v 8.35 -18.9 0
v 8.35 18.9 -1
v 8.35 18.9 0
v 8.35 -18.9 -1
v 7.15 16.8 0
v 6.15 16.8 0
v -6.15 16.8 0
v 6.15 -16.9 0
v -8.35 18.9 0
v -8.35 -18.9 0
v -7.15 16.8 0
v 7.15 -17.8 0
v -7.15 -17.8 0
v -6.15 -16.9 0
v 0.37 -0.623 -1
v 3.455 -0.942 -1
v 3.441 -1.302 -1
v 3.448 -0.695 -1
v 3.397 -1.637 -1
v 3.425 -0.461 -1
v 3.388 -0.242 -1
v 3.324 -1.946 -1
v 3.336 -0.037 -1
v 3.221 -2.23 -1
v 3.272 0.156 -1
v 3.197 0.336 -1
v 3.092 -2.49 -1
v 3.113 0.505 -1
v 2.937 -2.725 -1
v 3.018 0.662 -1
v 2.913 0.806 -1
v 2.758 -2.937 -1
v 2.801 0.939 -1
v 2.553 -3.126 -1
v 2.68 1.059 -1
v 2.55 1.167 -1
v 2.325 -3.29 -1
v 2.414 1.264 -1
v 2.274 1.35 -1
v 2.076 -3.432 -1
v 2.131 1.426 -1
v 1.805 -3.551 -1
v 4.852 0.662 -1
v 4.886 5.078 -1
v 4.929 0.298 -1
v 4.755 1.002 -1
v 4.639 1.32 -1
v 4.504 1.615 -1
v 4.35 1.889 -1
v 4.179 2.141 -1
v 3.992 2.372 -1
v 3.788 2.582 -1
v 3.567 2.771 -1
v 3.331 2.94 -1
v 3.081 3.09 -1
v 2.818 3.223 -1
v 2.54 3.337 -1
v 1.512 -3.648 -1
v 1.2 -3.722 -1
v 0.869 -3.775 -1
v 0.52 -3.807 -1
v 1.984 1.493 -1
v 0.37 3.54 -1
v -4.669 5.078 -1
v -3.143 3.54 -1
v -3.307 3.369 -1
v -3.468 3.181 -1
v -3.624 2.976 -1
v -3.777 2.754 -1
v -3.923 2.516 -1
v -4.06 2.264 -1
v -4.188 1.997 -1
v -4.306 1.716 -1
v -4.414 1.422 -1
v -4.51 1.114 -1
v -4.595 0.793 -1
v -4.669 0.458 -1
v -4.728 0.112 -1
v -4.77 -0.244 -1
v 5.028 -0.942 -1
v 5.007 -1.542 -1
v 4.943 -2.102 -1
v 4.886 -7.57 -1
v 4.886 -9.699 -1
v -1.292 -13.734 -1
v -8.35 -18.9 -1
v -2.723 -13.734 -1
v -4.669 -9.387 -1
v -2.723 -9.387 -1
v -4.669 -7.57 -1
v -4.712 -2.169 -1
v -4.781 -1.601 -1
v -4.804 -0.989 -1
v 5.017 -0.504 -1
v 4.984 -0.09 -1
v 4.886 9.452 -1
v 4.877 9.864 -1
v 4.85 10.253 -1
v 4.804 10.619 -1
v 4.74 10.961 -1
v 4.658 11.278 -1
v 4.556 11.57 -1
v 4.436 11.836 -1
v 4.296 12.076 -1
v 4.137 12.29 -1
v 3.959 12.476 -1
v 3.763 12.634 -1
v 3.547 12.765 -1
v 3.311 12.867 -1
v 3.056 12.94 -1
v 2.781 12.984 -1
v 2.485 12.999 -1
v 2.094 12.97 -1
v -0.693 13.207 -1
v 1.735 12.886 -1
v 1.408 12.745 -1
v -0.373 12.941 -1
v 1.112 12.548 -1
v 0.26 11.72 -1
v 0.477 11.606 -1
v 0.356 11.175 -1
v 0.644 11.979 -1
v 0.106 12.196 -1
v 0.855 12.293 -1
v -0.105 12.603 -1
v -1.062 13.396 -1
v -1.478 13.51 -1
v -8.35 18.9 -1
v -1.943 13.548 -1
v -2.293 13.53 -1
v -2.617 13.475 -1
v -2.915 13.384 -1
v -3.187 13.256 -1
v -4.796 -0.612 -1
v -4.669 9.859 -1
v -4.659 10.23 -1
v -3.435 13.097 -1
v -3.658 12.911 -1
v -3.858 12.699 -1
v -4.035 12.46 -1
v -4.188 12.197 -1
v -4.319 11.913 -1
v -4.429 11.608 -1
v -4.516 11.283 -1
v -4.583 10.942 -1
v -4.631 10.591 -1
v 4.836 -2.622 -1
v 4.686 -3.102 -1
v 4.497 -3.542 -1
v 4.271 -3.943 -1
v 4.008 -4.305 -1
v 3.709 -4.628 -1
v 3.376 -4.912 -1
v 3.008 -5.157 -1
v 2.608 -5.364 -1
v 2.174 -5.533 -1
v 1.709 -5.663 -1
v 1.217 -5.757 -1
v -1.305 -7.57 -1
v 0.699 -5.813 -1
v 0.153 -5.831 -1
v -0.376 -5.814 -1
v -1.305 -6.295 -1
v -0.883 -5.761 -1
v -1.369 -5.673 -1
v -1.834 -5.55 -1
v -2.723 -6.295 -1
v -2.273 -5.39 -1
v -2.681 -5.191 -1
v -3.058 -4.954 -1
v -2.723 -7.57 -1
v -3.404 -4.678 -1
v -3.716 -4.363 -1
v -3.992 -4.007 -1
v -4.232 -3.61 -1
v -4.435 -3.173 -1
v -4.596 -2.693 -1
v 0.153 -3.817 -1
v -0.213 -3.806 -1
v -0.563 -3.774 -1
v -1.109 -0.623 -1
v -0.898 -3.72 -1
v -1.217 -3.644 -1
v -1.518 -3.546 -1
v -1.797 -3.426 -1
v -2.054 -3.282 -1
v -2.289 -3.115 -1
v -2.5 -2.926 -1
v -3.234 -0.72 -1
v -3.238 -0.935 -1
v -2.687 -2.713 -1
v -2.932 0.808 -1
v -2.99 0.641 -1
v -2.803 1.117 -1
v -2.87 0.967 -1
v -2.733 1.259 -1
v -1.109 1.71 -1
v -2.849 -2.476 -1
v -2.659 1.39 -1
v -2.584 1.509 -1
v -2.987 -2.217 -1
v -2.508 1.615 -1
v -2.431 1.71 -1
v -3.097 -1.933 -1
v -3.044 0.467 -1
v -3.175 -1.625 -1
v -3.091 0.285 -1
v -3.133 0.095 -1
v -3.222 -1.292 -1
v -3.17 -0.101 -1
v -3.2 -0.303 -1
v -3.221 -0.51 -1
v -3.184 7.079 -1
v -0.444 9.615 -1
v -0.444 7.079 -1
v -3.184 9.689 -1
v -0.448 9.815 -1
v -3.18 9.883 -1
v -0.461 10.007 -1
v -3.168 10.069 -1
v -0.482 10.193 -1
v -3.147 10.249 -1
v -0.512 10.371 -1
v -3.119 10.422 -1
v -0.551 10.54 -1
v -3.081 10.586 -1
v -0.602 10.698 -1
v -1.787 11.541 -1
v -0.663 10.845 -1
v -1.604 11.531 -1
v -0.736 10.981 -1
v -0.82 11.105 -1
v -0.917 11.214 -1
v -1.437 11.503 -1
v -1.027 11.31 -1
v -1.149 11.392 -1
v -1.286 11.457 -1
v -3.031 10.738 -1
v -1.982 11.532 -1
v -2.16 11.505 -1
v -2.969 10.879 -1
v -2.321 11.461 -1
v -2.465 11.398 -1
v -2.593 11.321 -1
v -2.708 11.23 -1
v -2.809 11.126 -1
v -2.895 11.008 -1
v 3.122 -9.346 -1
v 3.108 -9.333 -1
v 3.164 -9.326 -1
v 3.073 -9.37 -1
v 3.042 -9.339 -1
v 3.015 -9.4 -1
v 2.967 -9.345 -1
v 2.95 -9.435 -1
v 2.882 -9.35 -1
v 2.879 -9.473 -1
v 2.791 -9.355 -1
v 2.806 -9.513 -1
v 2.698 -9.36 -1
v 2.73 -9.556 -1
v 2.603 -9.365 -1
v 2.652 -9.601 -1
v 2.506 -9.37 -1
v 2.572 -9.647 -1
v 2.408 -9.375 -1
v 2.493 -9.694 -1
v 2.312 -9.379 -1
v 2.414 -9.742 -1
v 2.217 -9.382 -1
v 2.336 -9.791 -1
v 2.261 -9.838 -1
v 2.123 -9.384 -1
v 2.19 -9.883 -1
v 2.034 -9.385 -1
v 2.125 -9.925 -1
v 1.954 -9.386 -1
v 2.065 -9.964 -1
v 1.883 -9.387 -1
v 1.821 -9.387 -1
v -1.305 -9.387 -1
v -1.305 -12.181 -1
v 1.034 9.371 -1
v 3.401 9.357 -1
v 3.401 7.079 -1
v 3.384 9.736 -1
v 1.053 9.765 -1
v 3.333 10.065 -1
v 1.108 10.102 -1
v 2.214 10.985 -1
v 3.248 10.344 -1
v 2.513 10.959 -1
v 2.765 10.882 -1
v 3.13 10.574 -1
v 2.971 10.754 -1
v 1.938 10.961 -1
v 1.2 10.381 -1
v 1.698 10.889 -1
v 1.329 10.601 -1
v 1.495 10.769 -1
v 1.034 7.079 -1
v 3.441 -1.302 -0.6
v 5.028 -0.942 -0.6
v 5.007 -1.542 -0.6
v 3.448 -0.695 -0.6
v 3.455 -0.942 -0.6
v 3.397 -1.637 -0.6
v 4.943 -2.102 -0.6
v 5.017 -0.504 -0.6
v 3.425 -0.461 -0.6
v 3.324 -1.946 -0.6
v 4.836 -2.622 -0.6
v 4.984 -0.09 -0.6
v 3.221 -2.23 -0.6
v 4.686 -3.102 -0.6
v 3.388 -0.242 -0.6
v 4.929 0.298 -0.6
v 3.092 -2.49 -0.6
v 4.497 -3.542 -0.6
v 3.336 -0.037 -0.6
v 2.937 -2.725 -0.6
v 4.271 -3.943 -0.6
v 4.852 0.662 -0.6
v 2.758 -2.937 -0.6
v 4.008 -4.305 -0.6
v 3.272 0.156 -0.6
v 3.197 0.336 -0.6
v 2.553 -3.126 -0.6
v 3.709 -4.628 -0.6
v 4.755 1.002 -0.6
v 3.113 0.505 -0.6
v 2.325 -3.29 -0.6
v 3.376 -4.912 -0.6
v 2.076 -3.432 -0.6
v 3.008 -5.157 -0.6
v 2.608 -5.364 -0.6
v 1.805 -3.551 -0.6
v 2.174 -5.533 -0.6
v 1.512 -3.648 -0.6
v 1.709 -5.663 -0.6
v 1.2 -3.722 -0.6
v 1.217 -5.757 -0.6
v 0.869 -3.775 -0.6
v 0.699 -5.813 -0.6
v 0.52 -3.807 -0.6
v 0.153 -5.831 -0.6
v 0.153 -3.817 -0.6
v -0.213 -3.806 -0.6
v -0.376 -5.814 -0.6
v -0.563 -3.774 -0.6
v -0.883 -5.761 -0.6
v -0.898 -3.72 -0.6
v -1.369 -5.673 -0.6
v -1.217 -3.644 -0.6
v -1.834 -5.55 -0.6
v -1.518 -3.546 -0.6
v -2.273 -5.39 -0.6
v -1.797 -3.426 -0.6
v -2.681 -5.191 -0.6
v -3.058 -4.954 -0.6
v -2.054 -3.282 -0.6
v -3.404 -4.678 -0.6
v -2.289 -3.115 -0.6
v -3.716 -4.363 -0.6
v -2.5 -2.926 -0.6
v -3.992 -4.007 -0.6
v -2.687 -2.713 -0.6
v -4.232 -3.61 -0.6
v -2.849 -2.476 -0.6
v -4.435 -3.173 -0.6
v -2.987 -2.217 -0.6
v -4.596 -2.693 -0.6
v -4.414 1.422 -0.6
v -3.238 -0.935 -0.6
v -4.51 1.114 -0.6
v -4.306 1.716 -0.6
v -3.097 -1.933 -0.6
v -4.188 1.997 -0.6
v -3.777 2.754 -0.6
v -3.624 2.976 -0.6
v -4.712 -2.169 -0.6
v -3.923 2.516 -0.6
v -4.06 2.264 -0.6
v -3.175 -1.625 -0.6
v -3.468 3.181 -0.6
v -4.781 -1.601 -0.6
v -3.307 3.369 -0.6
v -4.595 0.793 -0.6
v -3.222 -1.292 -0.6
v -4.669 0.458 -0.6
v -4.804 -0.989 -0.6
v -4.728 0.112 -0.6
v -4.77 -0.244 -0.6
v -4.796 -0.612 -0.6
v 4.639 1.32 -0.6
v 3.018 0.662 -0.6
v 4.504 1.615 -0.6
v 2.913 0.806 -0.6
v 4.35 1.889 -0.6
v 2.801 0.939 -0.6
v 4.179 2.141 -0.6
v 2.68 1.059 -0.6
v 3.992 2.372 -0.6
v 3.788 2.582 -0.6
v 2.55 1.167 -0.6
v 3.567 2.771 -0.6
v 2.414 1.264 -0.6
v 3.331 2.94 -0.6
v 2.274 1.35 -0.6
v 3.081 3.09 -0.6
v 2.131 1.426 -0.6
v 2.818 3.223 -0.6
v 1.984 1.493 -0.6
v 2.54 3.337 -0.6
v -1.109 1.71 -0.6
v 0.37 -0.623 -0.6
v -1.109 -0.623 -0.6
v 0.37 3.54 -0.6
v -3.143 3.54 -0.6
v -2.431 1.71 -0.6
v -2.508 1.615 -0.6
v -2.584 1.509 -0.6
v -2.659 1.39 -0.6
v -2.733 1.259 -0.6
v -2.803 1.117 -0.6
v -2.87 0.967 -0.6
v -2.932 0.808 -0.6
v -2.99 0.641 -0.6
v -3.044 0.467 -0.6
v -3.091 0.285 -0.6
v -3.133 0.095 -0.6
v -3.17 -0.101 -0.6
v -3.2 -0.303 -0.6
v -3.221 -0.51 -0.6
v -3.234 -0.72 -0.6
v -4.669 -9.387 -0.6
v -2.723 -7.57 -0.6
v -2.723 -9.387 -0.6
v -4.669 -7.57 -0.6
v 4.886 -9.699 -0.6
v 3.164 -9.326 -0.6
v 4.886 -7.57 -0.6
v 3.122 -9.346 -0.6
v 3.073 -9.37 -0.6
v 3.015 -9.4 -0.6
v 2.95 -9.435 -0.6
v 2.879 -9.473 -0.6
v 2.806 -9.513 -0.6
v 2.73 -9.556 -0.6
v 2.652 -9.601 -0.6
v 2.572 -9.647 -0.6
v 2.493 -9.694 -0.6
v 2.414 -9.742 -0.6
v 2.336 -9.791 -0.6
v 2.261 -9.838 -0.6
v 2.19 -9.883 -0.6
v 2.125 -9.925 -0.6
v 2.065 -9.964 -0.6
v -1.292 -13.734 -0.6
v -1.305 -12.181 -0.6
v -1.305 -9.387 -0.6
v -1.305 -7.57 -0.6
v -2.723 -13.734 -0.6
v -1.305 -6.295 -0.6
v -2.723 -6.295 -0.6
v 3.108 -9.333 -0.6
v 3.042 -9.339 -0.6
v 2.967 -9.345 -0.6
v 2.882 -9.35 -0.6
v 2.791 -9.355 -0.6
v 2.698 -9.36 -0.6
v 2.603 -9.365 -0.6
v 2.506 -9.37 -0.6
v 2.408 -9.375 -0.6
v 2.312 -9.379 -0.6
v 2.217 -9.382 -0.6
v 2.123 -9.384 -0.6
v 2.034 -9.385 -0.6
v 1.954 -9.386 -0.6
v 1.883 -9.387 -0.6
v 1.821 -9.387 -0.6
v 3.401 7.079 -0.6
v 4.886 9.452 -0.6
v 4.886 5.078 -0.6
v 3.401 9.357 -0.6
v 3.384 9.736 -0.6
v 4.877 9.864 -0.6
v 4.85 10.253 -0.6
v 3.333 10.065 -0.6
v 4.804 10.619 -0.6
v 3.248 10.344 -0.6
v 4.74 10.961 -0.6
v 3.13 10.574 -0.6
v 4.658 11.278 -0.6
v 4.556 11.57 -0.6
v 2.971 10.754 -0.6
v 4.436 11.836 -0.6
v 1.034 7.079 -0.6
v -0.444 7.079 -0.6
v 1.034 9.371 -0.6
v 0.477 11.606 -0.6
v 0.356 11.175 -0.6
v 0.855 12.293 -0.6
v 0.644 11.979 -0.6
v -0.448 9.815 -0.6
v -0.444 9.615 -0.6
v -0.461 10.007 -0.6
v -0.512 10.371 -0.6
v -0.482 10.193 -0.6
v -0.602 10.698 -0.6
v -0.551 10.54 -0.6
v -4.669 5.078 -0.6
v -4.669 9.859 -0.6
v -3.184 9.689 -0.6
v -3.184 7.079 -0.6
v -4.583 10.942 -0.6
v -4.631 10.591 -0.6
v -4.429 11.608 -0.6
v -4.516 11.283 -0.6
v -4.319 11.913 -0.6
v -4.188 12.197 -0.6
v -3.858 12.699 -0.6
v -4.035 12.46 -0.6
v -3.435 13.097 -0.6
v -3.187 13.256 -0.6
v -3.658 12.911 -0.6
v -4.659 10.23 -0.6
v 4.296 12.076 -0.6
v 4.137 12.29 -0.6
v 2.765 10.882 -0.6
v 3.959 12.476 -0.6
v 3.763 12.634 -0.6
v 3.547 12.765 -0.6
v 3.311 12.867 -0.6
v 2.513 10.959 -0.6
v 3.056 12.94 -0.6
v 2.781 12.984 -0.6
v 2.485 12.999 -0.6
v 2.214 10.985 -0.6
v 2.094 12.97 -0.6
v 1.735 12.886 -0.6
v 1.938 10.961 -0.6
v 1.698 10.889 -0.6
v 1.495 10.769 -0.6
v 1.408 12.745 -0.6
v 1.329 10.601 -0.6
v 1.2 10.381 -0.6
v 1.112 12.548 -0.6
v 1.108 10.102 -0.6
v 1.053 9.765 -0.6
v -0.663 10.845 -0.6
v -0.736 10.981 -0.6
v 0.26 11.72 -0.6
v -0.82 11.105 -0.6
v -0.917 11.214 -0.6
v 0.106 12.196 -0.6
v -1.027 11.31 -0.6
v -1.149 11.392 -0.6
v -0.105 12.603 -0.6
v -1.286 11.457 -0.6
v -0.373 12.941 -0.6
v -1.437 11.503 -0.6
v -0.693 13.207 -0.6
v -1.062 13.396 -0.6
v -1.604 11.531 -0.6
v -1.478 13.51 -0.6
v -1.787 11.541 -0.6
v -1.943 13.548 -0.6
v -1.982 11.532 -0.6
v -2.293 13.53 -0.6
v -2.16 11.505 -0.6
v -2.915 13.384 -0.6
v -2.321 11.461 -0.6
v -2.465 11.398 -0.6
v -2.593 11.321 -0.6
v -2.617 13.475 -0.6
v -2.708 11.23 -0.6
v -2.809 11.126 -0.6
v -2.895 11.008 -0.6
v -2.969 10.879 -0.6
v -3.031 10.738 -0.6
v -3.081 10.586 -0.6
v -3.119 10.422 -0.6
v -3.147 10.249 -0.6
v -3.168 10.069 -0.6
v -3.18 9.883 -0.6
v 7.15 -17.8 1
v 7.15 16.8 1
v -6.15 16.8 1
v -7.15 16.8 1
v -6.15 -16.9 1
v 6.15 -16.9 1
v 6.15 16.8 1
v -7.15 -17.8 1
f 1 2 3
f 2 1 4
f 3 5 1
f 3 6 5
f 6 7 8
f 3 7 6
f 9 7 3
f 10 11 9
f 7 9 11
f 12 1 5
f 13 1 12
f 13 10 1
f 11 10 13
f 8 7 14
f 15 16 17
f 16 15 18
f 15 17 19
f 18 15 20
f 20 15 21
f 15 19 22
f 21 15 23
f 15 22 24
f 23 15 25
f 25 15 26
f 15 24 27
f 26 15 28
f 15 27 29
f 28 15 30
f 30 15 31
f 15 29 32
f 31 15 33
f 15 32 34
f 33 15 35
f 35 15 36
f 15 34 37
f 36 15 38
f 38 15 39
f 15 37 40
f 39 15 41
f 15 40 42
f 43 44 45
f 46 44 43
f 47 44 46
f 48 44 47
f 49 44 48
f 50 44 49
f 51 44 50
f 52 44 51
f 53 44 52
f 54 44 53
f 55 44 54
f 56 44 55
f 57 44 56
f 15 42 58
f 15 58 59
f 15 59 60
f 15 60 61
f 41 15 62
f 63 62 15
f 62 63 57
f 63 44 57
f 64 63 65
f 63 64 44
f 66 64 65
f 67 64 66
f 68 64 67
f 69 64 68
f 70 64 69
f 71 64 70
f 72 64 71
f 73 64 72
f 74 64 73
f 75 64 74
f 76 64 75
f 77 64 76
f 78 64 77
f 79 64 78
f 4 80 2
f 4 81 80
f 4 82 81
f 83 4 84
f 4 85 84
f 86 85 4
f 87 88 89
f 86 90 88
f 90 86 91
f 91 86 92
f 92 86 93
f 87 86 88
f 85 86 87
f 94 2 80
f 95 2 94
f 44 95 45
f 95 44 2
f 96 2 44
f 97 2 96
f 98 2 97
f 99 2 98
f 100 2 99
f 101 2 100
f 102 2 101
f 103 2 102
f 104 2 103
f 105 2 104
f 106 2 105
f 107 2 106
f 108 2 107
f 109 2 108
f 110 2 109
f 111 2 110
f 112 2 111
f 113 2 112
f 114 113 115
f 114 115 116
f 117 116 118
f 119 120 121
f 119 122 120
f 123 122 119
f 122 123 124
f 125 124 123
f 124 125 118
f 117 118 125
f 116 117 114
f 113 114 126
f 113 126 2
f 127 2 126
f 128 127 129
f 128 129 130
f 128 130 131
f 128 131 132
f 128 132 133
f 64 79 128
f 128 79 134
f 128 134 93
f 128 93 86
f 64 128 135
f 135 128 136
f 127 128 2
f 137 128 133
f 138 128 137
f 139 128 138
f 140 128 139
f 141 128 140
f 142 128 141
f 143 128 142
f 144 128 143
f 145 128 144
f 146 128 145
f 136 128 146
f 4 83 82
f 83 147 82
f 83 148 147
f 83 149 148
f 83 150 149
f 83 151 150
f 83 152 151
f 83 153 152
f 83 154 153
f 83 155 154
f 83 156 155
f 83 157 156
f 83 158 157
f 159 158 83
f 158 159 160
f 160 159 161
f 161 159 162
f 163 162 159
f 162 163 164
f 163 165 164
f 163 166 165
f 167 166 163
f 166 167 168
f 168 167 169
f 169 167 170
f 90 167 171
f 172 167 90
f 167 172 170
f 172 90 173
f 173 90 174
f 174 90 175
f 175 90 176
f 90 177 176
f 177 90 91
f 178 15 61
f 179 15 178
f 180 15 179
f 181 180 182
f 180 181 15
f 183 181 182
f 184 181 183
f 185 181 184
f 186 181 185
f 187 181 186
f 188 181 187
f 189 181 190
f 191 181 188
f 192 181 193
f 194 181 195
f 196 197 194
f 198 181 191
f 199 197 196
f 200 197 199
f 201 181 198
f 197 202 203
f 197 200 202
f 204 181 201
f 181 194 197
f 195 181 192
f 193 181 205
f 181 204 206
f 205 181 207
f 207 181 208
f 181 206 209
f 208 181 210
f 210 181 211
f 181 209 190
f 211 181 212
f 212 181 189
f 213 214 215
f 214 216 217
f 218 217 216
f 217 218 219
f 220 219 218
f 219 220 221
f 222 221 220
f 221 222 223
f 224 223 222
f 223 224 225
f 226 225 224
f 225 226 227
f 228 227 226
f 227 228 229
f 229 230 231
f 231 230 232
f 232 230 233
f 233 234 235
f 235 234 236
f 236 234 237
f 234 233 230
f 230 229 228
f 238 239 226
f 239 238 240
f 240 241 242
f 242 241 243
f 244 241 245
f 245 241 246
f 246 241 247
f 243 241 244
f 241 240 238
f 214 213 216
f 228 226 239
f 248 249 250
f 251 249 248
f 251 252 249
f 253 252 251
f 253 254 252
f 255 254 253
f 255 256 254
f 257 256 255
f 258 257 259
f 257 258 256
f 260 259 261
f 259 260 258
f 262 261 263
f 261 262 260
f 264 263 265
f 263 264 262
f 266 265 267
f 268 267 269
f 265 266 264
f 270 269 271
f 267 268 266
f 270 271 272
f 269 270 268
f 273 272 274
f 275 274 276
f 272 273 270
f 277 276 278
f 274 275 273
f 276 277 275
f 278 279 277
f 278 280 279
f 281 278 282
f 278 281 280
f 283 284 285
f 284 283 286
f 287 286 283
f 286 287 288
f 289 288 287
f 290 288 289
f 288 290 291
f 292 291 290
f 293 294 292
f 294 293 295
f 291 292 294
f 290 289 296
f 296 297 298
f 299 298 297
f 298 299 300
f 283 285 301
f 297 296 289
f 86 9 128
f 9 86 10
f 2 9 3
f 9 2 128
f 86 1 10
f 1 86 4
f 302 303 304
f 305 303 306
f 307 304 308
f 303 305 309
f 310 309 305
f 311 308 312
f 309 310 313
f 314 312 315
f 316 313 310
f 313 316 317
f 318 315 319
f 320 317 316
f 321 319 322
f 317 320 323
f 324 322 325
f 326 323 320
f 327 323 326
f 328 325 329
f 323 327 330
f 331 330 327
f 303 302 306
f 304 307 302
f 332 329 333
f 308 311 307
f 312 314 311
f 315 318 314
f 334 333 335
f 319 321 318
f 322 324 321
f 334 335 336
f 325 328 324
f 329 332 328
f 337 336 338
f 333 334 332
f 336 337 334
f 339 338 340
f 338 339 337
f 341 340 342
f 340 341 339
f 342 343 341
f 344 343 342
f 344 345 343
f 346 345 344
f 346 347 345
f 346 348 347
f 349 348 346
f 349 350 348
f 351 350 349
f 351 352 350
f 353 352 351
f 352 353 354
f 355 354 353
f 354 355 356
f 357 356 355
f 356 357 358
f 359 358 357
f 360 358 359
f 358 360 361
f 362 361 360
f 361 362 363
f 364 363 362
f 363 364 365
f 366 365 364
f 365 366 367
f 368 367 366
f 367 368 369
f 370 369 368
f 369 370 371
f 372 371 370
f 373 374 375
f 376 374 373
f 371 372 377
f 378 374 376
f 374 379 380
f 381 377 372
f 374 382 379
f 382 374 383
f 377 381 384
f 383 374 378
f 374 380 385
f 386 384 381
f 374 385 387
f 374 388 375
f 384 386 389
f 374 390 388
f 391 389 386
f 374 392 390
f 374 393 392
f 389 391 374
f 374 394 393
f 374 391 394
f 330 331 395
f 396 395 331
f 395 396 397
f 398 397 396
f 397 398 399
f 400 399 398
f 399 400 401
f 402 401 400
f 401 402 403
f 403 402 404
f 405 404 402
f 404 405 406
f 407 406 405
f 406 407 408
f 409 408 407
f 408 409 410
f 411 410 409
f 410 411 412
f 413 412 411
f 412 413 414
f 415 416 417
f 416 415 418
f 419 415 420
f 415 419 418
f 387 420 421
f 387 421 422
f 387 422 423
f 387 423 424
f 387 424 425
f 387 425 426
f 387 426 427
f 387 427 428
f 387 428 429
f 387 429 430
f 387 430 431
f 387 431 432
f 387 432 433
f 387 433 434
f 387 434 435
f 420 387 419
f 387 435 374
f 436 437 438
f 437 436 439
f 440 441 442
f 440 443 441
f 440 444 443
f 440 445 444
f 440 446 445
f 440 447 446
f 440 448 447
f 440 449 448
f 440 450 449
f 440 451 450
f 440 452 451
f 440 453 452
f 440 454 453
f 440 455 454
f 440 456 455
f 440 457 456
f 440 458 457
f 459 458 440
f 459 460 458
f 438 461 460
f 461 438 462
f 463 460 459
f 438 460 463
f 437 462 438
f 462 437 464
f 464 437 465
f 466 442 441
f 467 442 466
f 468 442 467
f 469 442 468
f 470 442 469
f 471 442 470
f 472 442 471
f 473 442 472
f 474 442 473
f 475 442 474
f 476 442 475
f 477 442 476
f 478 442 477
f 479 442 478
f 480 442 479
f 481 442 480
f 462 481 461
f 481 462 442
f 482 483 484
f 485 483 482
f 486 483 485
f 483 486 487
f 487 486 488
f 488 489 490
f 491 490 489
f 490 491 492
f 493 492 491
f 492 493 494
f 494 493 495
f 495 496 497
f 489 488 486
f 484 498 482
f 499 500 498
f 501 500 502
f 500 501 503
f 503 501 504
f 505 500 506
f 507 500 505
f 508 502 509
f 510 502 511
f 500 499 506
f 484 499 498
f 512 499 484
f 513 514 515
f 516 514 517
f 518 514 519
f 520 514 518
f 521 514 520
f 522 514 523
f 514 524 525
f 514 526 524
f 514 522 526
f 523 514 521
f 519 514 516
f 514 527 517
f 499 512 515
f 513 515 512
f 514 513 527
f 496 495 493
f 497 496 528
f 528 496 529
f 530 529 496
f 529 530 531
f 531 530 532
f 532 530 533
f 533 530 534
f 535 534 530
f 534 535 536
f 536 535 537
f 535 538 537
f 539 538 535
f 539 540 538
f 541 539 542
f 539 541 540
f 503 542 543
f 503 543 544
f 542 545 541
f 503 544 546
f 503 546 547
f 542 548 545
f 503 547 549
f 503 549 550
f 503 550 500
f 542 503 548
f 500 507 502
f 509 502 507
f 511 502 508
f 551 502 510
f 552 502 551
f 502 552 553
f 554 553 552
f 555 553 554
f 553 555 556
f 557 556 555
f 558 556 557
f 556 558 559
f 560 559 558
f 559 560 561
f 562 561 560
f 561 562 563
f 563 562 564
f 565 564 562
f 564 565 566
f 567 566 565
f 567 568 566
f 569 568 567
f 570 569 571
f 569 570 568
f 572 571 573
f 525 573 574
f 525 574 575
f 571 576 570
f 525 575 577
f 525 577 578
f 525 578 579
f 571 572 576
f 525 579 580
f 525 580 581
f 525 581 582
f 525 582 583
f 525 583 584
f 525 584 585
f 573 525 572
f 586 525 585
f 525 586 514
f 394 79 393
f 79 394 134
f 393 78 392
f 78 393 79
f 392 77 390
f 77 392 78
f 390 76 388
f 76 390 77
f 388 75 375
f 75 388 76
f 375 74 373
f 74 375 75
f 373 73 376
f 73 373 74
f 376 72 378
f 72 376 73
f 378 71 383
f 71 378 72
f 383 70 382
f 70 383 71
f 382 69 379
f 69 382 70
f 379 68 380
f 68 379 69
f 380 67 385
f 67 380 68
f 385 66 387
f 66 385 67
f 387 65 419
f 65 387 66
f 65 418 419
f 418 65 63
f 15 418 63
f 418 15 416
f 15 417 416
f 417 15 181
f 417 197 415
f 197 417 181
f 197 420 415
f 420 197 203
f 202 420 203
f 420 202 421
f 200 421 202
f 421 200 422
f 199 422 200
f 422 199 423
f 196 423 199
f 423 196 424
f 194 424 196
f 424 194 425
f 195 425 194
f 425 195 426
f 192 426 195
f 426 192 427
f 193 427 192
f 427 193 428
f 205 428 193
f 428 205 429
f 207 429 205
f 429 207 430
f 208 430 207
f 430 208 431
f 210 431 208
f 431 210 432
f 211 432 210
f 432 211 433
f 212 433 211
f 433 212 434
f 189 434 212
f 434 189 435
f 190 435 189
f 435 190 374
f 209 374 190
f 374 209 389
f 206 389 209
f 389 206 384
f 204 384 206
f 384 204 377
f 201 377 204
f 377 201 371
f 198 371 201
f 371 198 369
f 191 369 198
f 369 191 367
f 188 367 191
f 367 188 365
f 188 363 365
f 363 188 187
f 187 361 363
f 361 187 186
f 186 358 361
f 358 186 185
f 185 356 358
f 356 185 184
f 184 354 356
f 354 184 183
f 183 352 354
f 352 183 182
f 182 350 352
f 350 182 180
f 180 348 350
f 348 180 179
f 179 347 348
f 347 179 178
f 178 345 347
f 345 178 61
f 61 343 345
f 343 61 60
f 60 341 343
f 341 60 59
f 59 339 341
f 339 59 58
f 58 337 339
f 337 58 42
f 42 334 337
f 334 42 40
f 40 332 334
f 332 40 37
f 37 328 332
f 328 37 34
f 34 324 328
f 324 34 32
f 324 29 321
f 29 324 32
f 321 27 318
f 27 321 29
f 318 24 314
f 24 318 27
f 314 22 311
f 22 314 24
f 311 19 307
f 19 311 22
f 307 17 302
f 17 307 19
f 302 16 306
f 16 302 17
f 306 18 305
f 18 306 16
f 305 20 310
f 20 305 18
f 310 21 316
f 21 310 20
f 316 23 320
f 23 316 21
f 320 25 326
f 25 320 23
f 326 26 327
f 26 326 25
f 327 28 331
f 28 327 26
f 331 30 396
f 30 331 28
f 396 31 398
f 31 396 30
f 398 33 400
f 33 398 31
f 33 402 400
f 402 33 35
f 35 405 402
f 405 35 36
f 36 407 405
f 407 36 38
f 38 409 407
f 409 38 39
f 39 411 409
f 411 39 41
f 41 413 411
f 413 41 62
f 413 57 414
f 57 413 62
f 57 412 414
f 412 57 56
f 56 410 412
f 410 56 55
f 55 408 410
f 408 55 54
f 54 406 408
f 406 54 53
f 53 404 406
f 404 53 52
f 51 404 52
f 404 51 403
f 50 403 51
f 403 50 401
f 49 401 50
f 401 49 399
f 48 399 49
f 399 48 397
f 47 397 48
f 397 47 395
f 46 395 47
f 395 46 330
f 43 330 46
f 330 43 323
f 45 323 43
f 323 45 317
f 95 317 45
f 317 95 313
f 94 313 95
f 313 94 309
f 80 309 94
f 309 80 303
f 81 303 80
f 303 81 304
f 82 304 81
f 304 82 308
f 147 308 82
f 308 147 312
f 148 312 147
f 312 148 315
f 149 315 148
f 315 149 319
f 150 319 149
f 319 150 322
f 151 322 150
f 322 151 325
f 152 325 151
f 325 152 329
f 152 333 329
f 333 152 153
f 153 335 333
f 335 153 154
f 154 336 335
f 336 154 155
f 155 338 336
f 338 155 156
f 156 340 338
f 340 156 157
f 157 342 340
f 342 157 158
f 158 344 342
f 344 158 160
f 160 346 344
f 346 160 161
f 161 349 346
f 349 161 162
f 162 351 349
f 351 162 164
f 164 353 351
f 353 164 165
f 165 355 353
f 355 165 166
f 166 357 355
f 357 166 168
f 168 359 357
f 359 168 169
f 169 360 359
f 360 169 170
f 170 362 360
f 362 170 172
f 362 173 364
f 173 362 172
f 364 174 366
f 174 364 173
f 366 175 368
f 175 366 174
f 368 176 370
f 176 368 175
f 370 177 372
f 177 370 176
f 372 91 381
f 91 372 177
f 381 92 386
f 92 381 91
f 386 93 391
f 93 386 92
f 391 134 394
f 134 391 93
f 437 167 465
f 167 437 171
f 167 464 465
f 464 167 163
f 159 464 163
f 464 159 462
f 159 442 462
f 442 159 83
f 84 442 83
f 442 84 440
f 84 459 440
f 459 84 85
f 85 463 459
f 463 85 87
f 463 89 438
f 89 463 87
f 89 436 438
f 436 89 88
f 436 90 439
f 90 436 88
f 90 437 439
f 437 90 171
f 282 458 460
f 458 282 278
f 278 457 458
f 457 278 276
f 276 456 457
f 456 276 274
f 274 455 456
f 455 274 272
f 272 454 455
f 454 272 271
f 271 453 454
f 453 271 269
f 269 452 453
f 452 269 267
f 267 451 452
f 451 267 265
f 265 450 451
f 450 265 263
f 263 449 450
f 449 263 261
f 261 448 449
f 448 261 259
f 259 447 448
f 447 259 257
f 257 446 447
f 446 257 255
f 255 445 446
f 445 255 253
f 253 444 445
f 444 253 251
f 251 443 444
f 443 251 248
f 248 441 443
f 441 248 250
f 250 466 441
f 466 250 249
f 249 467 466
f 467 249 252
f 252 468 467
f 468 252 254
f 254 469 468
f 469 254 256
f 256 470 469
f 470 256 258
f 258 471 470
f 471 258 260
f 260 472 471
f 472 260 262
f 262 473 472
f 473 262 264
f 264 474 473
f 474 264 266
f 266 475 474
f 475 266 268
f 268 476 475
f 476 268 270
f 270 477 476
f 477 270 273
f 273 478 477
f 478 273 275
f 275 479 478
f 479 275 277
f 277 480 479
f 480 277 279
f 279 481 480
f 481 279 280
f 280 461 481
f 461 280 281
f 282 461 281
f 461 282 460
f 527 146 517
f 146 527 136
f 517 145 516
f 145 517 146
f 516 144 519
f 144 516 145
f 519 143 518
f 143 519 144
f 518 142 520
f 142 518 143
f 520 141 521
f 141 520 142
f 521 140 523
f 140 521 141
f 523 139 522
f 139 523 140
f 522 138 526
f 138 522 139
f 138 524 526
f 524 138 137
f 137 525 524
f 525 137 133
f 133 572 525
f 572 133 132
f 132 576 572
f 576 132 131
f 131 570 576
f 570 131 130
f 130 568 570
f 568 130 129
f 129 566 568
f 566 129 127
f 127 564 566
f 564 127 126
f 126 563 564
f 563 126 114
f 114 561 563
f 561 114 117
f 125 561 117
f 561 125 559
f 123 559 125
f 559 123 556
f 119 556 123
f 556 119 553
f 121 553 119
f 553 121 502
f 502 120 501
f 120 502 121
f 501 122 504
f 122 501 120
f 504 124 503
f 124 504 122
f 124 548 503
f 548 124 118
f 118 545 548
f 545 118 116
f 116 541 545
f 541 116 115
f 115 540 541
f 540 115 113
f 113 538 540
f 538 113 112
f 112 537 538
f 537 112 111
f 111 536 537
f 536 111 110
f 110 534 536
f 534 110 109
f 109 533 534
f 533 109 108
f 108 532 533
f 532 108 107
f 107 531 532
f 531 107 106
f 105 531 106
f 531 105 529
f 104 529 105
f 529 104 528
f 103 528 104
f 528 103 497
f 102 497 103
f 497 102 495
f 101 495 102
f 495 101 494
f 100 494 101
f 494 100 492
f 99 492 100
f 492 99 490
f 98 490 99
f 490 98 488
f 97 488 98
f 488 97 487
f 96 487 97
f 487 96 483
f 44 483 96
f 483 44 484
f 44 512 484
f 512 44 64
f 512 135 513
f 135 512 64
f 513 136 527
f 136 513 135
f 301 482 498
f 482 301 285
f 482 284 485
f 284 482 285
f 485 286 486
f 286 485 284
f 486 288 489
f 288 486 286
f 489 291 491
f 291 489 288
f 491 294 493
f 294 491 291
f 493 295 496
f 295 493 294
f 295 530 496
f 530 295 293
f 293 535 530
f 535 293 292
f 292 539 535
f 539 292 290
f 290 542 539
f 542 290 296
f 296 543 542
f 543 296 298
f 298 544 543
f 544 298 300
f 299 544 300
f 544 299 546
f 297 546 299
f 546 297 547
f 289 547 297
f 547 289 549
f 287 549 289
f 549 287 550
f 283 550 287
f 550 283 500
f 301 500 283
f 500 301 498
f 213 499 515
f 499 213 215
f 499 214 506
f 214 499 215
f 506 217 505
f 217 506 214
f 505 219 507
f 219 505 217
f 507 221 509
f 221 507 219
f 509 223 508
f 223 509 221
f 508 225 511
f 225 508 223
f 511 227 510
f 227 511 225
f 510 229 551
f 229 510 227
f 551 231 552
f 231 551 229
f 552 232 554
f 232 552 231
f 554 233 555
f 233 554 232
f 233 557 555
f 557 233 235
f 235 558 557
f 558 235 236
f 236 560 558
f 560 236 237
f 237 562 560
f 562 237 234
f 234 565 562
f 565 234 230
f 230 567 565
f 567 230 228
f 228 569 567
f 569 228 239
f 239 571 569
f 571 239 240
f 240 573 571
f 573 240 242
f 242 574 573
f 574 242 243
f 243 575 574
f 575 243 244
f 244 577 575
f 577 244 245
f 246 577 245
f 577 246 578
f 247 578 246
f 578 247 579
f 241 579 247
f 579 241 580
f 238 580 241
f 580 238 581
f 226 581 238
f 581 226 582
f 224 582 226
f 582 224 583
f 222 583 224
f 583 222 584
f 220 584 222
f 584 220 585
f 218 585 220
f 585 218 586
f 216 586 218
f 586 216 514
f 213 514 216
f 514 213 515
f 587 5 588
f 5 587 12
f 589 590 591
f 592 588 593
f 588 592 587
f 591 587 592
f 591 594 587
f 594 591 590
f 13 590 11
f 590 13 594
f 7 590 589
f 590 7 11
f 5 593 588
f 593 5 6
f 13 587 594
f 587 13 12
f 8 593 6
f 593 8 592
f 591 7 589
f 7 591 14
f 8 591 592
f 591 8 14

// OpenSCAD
notchWidth = 1.2; //Width of slots on the side of the PCB
portLength = 23.4; //Distance between the front of the slot to the end of the USB port
boardLength = 23.4; //Dsitance from the rear of the slot to the back of the board
boardWidth = 14.7; // Width from one side of the board to the other
capacity = "4GB"; //The capacity of the drive to be written on the bottom
textSize = 10; // If you have a very large or small drive you can change the text size (default = 6)

USBLength = 12.2; // The required length of protruding port (should remain constant)
USBWidth = 12.7; // The width of a USB port (should remain constant)

unitLength = boardLength+notchWidth+(portLength-USBLength)+2;
difference(){
    translate([0, 0, -0.5])
        cube([boardWidth+2, unitLength,1], center=true);
    translate([0,0,-0.6])
        rotate([180,0,90])
            linear_extrude(height = 0.5)
                text(text = capacity, font = "Liberation Sans:style=Bold", size = textSize, valign = "center", halign = "center");
}
difference(){
    translate([0, -0.5, 0.5])
        cube([boardWidth-0.4, unitLength-3.2,1], center = true);
    translate([0, 1, 0.5])
        cube([boardWidth-2.4, unitLength-2,1.1], center = true);
}
